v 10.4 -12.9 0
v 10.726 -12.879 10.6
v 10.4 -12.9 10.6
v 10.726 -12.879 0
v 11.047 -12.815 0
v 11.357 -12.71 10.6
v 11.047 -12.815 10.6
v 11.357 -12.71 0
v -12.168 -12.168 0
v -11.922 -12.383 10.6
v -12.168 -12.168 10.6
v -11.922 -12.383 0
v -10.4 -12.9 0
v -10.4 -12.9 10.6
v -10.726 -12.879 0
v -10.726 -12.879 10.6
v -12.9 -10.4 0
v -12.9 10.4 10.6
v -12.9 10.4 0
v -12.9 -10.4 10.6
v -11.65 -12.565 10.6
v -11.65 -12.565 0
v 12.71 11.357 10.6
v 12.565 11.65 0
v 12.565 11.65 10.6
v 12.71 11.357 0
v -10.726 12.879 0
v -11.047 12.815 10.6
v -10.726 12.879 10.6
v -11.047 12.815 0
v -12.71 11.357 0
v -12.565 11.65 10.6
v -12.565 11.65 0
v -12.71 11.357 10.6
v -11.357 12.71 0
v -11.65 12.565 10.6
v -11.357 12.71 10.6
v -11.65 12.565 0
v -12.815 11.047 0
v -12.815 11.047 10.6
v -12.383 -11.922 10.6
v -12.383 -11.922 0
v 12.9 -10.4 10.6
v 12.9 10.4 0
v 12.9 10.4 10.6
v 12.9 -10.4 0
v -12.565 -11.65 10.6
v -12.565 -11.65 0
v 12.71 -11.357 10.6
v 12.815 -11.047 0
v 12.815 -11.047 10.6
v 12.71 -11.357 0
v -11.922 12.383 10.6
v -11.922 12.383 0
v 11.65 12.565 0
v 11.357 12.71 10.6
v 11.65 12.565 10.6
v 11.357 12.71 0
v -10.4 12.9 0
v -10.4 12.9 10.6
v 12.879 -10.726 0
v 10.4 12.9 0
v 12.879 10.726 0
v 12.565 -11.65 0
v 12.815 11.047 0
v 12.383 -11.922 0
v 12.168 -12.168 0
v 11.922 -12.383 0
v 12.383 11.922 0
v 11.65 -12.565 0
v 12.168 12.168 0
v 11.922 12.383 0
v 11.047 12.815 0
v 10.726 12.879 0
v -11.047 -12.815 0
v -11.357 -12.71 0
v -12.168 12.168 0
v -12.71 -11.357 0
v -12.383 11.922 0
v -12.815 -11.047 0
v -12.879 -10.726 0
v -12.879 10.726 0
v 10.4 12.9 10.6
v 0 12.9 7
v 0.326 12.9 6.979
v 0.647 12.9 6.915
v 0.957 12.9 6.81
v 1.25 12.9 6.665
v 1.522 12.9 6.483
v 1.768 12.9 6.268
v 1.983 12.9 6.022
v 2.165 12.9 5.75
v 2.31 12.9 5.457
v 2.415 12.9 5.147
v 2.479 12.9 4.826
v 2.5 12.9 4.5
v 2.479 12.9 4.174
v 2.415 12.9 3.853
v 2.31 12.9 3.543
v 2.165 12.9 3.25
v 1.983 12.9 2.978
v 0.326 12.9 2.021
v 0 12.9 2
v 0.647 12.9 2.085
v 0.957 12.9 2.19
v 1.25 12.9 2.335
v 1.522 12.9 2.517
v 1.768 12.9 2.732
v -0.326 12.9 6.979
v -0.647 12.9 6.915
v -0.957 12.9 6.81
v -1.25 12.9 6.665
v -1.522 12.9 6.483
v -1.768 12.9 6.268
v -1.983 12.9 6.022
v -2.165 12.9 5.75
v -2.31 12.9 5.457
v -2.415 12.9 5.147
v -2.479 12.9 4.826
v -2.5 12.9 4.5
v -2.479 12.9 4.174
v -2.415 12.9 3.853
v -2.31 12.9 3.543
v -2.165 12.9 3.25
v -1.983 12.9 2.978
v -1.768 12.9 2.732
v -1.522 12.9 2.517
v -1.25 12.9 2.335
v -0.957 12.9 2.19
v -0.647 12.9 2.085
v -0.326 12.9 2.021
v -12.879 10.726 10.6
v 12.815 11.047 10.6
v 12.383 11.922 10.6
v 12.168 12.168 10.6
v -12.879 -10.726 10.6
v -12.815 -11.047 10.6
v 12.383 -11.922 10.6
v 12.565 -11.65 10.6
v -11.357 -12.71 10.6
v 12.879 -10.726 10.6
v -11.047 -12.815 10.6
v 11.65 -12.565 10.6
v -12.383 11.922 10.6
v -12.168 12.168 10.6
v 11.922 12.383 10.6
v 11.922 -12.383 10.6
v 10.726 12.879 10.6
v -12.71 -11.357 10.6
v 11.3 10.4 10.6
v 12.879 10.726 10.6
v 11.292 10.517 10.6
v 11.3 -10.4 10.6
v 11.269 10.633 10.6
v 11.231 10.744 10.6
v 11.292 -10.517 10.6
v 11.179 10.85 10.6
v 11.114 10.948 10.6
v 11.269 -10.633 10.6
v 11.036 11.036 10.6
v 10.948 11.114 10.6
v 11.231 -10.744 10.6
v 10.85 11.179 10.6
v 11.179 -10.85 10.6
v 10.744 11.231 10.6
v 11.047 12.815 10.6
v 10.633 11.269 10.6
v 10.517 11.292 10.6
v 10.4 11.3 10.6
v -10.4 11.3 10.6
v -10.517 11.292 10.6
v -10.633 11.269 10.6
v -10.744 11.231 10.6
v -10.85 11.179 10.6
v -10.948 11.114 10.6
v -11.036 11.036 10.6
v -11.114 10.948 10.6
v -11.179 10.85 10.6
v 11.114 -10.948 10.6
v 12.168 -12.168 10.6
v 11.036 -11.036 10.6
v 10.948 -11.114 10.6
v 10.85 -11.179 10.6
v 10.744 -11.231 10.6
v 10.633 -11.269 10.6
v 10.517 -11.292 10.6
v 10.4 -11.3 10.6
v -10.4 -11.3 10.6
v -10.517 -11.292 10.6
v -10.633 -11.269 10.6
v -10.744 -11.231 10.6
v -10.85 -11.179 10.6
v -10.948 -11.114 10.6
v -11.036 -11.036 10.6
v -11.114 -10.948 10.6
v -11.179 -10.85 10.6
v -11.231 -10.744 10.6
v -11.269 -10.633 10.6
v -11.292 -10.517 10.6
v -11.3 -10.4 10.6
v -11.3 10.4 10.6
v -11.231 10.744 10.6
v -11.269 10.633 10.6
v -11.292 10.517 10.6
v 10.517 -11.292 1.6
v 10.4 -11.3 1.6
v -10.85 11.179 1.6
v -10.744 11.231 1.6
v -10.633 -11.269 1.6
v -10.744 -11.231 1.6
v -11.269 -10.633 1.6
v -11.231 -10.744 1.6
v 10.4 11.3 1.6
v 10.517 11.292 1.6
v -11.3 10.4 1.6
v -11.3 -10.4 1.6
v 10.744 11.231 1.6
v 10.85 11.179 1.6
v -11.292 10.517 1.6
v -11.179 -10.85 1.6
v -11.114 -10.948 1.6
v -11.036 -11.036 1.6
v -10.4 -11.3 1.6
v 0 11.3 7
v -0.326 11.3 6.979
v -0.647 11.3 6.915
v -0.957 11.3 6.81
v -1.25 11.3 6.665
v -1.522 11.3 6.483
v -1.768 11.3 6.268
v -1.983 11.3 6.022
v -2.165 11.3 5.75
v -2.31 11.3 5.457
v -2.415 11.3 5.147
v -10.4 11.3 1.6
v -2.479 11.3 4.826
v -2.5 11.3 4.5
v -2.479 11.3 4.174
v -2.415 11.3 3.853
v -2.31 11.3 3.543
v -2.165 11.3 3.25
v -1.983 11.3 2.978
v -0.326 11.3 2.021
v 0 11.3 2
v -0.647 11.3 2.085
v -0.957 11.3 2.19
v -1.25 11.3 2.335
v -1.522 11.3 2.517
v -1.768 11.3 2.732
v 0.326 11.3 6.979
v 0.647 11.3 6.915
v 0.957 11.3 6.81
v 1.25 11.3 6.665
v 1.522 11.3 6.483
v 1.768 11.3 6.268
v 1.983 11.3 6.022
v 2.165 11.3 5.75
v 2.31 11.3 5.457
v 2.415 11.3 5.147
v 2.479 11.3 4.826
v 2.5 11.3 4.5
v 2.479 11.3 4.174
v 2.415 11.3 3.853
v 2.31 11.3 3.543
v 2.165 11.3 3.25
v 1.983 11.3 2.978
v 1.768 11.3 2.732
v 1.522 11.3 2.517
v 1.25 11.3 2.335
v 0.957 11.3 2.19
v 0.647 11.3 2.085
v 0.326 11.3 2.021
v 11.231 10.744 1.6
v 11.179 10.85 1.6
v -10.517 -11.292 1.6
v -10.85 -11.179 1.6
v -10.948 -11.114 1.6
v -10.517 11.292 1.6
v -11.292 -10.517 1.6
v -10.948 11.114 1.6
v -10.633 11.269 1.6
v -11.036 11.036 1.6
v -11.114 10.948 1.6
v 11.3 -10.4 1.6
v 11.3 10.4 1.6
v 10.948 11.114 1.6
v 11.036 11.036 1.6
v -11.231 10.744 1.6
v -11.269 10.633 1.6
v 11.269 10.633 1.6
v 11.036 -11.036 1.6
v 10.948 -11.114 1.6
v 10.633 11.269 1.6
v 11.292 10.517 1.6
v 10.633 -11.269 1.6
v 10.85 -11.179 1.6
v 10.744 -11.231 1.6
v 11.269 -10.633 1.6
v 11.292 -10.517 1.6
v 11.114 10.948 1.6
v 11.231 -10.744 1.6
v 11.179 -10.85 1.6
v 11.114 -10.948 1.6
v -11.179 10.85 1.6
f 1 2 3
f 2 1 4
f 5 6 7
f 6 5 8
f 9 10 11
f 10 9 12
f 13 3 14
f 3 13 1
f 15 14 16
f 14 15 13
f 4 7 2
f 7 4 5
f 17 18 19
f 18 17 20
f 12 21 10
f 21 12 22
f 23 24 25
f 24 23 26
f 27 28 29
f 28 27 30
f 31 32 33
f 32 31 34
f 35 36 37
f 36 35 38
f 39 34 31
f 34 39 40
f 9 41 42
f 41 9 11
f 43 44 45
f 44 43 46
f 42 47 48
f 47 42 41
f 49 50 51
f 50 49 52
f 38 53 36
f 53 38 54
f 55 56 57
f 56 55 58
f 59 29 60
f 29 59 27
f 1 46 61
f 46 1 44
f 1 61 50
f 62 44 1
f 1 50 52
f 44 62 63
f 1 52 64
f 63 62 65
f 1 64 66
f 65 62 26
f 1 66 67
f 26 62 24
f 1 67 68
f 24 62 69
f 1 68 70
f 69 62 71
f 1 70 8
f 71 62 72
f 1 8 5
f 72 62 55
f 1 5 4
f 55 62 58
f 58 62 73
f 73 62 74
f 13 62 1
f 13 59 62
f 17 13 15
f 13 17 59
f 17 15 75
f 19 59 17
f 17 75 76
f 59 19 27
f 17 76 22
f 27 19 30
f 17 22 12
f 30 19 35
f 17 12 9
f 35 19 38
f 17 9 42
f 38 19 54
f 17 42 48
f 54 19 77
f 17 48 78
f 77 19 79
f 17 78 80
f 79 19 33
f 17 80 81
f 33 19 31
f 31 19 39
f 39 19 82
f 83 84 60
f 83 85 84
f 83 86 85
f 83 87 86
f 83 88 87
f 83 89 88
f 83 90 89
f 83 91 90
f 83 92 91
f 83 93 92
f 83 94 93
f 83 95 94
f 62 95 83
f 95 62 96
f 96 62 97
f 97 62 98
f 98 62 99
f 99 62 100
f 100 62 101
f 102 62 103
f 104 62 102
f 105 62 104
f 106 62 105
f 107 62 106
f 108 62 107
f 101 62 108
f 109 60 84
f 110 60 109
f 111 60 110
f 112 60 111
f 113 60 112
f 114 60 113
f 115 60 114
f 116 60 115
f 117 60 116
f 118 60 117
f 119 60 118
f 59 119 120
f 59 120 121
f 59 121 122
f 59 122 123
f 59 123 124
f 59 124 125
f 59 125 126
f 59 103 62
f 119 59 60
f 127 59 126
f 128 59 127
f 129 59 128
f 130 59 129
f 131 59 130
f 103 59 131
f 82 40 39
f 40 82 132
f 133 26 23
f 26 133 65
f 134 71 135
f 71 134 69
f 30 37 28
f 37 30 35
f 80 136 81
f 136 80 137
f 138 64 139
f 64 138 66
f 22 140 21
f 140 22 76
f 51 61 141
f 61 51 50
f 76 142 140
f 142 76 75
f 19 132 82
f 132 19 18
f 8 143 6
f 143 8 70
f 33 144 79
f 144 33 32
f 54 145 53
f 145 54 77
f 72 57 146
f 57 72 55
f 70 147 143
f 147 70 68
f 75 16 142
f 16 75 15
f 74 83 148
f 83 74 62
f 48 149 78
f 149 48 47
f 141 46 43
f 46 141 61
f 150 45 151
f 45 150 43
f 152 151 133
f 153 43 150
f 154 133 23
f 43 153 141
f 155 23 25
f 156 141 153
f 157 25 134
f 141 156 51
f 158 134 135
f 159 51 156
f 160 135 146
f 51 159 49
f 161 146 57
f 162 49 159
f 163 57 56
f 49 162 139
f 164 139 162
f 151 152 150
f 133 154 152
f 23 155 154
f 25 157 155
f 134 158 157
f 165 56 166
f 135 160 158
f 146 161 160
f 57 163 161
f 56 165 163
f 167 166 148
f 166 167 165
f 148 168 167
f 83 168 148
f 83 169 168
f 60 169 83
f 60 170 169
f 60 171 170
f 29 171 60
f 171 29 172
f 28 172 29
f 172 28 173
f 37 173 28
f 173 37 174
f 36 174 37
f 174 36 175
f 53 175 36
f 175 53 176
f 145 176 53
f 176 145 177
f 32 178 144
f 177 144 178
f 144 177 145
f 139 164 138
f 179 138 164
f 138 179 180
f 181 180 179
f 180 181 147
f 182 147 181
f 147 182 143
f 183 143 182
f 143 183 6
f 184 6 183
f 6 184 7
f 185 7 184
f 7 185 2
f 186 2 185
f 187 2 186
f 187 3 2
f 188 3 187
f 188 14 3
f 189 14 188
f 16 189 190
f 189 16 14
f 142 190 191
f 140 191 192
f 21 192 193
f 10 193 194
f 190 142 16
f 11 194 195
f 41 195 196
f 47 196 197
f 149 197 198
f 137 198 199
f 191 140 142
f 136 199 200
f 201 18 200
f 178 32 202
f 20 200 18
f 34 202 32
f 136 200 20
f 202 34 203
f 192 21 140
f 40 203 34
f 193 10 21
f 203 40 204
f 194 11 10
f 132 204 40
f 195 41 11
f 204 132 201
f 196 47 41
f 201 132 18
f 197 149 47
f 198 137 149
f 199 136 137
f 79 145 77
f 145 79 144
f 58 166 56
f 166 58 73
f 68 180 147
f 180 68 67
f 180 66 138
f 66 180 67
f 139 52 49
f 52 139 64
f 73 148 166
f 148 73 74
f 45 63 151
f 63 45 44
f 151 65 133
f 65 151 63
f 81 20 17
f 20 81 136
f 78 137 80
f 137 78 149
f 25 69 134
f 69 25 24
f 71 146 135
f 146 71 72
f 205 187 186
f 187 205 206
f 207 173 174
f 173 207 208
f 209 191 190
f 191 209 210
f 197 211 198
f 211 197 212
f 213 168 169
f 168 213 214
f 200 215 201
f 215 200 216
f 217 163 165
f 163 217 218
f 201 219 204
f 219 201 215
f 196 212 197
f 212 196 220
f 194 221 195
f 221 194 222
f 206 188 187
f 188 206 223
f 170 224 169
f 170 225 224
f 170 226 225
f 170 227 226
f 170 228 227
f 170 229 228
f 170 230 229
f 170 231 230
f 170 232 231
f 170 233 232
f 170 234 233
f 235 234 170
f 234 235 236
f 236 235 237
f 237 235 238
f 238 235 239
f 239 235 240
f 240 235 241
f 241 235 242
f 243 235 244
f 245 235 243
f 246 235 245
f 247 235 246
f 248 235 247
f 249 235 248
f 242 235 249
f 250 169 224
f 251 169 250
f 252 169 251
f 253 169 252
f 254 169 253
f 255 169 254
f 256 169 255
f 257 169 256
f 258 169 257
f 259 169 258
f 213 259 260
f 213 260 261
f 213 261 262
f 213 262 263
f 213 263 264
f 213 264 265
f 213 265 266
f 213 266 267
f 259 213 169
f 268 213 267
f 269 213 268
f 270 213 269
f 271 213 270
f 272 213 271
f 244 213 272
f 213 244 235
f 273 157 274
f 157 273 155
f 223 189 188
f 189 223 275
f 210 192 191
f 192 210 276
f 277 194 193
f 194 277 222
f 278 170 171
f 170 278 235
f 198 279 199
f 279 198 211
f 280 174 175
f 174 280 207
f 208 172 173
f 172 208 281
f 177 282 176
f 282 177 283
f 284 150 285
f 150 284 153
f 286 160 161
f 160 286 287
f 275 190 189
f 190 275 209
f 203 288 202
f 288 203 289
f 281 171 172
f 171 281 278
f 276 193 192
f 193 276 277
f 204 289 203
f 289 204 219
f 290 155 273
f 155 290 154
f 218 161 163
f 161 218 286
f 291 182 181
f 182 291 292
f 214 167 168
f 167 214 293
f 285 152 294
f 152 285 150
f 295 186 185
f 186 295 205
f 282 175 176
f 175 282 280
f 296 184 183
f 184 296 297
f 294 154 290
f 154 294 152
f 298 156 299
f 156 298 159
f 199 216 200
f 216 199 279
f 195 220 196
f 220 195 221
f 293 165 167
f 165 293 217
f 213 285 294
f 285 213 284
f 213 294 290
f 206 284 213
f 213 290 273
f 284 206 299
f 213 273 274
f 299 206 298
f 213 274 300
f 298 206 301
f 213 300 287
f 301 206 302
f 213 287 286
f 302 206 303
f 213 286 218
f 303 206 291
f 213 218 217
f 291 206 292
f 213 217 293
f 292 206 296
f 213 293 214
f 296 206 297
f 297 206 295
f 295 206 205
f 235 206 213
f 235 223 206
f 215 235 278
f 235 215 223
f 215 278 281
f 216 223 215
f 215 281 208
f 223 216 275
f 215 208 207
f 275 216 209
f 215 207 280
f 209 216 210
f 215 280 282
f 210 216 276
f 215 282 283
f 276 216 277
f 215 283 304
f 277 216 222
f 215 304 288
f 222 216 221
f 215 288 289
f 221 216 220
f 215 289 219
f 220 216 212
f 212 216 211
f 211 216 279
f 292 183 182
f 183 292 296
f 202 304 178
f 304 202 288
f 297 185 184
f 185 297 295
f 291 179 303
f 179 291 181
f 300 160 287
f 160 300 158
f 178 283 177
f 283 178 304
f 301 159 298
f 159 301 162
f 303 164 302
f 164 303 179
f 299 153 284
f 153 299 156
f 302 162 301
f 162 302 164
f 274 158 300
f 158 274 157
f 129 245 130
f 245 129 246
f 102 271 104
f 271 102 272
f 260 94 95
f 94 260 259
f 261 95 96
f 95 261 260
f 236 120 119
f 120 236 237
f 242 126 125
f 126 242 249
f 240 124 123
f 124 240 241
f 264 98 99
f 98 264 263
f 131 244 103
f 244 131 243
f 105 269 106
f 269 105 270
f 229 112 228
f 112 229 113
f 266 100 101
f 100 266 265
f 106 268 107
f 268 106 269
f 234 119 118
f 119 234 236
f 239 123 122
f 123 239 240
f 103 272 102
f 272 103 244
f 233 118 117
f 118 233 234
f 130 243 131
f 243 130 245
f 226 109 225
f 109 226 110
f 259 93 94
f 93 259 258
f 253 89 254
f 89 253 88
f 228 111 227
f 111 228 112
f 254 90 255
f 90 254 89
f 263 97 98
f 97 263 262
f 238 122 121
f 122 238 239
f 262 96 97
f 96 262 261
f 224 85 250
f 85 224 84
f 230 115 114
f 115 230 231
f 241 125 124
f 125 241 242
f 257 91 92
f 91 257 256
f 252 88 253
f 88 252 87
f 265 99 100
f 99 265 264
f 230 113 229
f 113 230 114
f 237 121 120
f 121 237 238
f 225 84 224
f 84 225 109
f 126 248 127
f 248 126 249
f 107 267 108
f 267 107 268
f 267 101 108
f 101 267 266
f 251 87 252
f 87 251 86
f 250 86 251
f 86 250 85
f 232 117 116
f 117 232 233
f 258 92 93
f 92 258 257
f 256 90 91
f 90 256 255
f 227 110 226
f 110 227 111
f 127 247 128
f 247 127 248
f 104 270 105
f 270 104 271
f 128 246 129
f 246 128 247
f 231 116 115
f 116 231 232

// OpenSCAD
$fn = 48;

part = "both"; // "bottom", "lid", "both"

pcb_x = 22;
pcb_y = 22;
pcb_z = 1;
pcb_overall_z = 8;

clearance = 0.3;
top_clearance = 1.0;

wall_thickness = 1.6;
floor_thickness = 1.6;
lid_thickness = 1.4;

// Lid locating lip
lid_lip_depth = 2.0;
lid_lip_clearance = 0.25;

// Rounded case corners
corner_r = 2.5;

through_hole_side = -1;
cable_side = -through_hole_side;
cable_hole_d = 5;
cable_hole_z = 4.5;

inner_x = pcb_x + clearance * 2;
inner_y = pcb_y + clearance * 2;
inner_z = pcb_overall_z + top_clearance;

outer_x = inner_x + wall_thickness * 2;
outer_y = inner_y + wall_thickness * 2;
outer_z = floor_thickness + inner_z;

lid_z = lid_thickness + lid_lip_depth;

module rounded_box(size, r) {
    x = size[0];
    y = size[1];
    z = size[2];
    linear_extrude(height = z)
        offset(r = r)
            square([x - 2*r, y - 2*r], center = true);
}

module rounded_rect_2d(size, r) {
    x = size[0];
    y = size[1];
    offset(r = r)
        square([x - 2*r, y - 2*r], center = true);
}
module cable_slot_cut() {
    translate([
        0,
        cable_side * (outer_y / 2 + 0.1),
        cable_hole_z
    ])
    rotate([90, 0, 0])
        cylinder(
            h = wall_thickness + 2,
            d = cable_hole_d,
            center = true
        );
}
module bottom_case() {
    difference() {
        // Outer body
        rounded_box([outer_x, outer_y, outer_z], corner_r);
        // Hollow cavity
        translate([0, 0, floor_thickness])
            rounded_box(
                [inner_x, inner_y, inner_z + 0.2],
                max(corner_r - wall_thickness, 0.8)
            );
        cable_slot_cut();
    }
    // Small PCB support ledge/pad
    // This keeps the board slightly off the bottom.
    translate([0, 0, floor_thickness / 2])
        cube([pcb_x - 2, pcb_y - 2, 0.6], center = true);
}

module lid() {}

bottom_case();
